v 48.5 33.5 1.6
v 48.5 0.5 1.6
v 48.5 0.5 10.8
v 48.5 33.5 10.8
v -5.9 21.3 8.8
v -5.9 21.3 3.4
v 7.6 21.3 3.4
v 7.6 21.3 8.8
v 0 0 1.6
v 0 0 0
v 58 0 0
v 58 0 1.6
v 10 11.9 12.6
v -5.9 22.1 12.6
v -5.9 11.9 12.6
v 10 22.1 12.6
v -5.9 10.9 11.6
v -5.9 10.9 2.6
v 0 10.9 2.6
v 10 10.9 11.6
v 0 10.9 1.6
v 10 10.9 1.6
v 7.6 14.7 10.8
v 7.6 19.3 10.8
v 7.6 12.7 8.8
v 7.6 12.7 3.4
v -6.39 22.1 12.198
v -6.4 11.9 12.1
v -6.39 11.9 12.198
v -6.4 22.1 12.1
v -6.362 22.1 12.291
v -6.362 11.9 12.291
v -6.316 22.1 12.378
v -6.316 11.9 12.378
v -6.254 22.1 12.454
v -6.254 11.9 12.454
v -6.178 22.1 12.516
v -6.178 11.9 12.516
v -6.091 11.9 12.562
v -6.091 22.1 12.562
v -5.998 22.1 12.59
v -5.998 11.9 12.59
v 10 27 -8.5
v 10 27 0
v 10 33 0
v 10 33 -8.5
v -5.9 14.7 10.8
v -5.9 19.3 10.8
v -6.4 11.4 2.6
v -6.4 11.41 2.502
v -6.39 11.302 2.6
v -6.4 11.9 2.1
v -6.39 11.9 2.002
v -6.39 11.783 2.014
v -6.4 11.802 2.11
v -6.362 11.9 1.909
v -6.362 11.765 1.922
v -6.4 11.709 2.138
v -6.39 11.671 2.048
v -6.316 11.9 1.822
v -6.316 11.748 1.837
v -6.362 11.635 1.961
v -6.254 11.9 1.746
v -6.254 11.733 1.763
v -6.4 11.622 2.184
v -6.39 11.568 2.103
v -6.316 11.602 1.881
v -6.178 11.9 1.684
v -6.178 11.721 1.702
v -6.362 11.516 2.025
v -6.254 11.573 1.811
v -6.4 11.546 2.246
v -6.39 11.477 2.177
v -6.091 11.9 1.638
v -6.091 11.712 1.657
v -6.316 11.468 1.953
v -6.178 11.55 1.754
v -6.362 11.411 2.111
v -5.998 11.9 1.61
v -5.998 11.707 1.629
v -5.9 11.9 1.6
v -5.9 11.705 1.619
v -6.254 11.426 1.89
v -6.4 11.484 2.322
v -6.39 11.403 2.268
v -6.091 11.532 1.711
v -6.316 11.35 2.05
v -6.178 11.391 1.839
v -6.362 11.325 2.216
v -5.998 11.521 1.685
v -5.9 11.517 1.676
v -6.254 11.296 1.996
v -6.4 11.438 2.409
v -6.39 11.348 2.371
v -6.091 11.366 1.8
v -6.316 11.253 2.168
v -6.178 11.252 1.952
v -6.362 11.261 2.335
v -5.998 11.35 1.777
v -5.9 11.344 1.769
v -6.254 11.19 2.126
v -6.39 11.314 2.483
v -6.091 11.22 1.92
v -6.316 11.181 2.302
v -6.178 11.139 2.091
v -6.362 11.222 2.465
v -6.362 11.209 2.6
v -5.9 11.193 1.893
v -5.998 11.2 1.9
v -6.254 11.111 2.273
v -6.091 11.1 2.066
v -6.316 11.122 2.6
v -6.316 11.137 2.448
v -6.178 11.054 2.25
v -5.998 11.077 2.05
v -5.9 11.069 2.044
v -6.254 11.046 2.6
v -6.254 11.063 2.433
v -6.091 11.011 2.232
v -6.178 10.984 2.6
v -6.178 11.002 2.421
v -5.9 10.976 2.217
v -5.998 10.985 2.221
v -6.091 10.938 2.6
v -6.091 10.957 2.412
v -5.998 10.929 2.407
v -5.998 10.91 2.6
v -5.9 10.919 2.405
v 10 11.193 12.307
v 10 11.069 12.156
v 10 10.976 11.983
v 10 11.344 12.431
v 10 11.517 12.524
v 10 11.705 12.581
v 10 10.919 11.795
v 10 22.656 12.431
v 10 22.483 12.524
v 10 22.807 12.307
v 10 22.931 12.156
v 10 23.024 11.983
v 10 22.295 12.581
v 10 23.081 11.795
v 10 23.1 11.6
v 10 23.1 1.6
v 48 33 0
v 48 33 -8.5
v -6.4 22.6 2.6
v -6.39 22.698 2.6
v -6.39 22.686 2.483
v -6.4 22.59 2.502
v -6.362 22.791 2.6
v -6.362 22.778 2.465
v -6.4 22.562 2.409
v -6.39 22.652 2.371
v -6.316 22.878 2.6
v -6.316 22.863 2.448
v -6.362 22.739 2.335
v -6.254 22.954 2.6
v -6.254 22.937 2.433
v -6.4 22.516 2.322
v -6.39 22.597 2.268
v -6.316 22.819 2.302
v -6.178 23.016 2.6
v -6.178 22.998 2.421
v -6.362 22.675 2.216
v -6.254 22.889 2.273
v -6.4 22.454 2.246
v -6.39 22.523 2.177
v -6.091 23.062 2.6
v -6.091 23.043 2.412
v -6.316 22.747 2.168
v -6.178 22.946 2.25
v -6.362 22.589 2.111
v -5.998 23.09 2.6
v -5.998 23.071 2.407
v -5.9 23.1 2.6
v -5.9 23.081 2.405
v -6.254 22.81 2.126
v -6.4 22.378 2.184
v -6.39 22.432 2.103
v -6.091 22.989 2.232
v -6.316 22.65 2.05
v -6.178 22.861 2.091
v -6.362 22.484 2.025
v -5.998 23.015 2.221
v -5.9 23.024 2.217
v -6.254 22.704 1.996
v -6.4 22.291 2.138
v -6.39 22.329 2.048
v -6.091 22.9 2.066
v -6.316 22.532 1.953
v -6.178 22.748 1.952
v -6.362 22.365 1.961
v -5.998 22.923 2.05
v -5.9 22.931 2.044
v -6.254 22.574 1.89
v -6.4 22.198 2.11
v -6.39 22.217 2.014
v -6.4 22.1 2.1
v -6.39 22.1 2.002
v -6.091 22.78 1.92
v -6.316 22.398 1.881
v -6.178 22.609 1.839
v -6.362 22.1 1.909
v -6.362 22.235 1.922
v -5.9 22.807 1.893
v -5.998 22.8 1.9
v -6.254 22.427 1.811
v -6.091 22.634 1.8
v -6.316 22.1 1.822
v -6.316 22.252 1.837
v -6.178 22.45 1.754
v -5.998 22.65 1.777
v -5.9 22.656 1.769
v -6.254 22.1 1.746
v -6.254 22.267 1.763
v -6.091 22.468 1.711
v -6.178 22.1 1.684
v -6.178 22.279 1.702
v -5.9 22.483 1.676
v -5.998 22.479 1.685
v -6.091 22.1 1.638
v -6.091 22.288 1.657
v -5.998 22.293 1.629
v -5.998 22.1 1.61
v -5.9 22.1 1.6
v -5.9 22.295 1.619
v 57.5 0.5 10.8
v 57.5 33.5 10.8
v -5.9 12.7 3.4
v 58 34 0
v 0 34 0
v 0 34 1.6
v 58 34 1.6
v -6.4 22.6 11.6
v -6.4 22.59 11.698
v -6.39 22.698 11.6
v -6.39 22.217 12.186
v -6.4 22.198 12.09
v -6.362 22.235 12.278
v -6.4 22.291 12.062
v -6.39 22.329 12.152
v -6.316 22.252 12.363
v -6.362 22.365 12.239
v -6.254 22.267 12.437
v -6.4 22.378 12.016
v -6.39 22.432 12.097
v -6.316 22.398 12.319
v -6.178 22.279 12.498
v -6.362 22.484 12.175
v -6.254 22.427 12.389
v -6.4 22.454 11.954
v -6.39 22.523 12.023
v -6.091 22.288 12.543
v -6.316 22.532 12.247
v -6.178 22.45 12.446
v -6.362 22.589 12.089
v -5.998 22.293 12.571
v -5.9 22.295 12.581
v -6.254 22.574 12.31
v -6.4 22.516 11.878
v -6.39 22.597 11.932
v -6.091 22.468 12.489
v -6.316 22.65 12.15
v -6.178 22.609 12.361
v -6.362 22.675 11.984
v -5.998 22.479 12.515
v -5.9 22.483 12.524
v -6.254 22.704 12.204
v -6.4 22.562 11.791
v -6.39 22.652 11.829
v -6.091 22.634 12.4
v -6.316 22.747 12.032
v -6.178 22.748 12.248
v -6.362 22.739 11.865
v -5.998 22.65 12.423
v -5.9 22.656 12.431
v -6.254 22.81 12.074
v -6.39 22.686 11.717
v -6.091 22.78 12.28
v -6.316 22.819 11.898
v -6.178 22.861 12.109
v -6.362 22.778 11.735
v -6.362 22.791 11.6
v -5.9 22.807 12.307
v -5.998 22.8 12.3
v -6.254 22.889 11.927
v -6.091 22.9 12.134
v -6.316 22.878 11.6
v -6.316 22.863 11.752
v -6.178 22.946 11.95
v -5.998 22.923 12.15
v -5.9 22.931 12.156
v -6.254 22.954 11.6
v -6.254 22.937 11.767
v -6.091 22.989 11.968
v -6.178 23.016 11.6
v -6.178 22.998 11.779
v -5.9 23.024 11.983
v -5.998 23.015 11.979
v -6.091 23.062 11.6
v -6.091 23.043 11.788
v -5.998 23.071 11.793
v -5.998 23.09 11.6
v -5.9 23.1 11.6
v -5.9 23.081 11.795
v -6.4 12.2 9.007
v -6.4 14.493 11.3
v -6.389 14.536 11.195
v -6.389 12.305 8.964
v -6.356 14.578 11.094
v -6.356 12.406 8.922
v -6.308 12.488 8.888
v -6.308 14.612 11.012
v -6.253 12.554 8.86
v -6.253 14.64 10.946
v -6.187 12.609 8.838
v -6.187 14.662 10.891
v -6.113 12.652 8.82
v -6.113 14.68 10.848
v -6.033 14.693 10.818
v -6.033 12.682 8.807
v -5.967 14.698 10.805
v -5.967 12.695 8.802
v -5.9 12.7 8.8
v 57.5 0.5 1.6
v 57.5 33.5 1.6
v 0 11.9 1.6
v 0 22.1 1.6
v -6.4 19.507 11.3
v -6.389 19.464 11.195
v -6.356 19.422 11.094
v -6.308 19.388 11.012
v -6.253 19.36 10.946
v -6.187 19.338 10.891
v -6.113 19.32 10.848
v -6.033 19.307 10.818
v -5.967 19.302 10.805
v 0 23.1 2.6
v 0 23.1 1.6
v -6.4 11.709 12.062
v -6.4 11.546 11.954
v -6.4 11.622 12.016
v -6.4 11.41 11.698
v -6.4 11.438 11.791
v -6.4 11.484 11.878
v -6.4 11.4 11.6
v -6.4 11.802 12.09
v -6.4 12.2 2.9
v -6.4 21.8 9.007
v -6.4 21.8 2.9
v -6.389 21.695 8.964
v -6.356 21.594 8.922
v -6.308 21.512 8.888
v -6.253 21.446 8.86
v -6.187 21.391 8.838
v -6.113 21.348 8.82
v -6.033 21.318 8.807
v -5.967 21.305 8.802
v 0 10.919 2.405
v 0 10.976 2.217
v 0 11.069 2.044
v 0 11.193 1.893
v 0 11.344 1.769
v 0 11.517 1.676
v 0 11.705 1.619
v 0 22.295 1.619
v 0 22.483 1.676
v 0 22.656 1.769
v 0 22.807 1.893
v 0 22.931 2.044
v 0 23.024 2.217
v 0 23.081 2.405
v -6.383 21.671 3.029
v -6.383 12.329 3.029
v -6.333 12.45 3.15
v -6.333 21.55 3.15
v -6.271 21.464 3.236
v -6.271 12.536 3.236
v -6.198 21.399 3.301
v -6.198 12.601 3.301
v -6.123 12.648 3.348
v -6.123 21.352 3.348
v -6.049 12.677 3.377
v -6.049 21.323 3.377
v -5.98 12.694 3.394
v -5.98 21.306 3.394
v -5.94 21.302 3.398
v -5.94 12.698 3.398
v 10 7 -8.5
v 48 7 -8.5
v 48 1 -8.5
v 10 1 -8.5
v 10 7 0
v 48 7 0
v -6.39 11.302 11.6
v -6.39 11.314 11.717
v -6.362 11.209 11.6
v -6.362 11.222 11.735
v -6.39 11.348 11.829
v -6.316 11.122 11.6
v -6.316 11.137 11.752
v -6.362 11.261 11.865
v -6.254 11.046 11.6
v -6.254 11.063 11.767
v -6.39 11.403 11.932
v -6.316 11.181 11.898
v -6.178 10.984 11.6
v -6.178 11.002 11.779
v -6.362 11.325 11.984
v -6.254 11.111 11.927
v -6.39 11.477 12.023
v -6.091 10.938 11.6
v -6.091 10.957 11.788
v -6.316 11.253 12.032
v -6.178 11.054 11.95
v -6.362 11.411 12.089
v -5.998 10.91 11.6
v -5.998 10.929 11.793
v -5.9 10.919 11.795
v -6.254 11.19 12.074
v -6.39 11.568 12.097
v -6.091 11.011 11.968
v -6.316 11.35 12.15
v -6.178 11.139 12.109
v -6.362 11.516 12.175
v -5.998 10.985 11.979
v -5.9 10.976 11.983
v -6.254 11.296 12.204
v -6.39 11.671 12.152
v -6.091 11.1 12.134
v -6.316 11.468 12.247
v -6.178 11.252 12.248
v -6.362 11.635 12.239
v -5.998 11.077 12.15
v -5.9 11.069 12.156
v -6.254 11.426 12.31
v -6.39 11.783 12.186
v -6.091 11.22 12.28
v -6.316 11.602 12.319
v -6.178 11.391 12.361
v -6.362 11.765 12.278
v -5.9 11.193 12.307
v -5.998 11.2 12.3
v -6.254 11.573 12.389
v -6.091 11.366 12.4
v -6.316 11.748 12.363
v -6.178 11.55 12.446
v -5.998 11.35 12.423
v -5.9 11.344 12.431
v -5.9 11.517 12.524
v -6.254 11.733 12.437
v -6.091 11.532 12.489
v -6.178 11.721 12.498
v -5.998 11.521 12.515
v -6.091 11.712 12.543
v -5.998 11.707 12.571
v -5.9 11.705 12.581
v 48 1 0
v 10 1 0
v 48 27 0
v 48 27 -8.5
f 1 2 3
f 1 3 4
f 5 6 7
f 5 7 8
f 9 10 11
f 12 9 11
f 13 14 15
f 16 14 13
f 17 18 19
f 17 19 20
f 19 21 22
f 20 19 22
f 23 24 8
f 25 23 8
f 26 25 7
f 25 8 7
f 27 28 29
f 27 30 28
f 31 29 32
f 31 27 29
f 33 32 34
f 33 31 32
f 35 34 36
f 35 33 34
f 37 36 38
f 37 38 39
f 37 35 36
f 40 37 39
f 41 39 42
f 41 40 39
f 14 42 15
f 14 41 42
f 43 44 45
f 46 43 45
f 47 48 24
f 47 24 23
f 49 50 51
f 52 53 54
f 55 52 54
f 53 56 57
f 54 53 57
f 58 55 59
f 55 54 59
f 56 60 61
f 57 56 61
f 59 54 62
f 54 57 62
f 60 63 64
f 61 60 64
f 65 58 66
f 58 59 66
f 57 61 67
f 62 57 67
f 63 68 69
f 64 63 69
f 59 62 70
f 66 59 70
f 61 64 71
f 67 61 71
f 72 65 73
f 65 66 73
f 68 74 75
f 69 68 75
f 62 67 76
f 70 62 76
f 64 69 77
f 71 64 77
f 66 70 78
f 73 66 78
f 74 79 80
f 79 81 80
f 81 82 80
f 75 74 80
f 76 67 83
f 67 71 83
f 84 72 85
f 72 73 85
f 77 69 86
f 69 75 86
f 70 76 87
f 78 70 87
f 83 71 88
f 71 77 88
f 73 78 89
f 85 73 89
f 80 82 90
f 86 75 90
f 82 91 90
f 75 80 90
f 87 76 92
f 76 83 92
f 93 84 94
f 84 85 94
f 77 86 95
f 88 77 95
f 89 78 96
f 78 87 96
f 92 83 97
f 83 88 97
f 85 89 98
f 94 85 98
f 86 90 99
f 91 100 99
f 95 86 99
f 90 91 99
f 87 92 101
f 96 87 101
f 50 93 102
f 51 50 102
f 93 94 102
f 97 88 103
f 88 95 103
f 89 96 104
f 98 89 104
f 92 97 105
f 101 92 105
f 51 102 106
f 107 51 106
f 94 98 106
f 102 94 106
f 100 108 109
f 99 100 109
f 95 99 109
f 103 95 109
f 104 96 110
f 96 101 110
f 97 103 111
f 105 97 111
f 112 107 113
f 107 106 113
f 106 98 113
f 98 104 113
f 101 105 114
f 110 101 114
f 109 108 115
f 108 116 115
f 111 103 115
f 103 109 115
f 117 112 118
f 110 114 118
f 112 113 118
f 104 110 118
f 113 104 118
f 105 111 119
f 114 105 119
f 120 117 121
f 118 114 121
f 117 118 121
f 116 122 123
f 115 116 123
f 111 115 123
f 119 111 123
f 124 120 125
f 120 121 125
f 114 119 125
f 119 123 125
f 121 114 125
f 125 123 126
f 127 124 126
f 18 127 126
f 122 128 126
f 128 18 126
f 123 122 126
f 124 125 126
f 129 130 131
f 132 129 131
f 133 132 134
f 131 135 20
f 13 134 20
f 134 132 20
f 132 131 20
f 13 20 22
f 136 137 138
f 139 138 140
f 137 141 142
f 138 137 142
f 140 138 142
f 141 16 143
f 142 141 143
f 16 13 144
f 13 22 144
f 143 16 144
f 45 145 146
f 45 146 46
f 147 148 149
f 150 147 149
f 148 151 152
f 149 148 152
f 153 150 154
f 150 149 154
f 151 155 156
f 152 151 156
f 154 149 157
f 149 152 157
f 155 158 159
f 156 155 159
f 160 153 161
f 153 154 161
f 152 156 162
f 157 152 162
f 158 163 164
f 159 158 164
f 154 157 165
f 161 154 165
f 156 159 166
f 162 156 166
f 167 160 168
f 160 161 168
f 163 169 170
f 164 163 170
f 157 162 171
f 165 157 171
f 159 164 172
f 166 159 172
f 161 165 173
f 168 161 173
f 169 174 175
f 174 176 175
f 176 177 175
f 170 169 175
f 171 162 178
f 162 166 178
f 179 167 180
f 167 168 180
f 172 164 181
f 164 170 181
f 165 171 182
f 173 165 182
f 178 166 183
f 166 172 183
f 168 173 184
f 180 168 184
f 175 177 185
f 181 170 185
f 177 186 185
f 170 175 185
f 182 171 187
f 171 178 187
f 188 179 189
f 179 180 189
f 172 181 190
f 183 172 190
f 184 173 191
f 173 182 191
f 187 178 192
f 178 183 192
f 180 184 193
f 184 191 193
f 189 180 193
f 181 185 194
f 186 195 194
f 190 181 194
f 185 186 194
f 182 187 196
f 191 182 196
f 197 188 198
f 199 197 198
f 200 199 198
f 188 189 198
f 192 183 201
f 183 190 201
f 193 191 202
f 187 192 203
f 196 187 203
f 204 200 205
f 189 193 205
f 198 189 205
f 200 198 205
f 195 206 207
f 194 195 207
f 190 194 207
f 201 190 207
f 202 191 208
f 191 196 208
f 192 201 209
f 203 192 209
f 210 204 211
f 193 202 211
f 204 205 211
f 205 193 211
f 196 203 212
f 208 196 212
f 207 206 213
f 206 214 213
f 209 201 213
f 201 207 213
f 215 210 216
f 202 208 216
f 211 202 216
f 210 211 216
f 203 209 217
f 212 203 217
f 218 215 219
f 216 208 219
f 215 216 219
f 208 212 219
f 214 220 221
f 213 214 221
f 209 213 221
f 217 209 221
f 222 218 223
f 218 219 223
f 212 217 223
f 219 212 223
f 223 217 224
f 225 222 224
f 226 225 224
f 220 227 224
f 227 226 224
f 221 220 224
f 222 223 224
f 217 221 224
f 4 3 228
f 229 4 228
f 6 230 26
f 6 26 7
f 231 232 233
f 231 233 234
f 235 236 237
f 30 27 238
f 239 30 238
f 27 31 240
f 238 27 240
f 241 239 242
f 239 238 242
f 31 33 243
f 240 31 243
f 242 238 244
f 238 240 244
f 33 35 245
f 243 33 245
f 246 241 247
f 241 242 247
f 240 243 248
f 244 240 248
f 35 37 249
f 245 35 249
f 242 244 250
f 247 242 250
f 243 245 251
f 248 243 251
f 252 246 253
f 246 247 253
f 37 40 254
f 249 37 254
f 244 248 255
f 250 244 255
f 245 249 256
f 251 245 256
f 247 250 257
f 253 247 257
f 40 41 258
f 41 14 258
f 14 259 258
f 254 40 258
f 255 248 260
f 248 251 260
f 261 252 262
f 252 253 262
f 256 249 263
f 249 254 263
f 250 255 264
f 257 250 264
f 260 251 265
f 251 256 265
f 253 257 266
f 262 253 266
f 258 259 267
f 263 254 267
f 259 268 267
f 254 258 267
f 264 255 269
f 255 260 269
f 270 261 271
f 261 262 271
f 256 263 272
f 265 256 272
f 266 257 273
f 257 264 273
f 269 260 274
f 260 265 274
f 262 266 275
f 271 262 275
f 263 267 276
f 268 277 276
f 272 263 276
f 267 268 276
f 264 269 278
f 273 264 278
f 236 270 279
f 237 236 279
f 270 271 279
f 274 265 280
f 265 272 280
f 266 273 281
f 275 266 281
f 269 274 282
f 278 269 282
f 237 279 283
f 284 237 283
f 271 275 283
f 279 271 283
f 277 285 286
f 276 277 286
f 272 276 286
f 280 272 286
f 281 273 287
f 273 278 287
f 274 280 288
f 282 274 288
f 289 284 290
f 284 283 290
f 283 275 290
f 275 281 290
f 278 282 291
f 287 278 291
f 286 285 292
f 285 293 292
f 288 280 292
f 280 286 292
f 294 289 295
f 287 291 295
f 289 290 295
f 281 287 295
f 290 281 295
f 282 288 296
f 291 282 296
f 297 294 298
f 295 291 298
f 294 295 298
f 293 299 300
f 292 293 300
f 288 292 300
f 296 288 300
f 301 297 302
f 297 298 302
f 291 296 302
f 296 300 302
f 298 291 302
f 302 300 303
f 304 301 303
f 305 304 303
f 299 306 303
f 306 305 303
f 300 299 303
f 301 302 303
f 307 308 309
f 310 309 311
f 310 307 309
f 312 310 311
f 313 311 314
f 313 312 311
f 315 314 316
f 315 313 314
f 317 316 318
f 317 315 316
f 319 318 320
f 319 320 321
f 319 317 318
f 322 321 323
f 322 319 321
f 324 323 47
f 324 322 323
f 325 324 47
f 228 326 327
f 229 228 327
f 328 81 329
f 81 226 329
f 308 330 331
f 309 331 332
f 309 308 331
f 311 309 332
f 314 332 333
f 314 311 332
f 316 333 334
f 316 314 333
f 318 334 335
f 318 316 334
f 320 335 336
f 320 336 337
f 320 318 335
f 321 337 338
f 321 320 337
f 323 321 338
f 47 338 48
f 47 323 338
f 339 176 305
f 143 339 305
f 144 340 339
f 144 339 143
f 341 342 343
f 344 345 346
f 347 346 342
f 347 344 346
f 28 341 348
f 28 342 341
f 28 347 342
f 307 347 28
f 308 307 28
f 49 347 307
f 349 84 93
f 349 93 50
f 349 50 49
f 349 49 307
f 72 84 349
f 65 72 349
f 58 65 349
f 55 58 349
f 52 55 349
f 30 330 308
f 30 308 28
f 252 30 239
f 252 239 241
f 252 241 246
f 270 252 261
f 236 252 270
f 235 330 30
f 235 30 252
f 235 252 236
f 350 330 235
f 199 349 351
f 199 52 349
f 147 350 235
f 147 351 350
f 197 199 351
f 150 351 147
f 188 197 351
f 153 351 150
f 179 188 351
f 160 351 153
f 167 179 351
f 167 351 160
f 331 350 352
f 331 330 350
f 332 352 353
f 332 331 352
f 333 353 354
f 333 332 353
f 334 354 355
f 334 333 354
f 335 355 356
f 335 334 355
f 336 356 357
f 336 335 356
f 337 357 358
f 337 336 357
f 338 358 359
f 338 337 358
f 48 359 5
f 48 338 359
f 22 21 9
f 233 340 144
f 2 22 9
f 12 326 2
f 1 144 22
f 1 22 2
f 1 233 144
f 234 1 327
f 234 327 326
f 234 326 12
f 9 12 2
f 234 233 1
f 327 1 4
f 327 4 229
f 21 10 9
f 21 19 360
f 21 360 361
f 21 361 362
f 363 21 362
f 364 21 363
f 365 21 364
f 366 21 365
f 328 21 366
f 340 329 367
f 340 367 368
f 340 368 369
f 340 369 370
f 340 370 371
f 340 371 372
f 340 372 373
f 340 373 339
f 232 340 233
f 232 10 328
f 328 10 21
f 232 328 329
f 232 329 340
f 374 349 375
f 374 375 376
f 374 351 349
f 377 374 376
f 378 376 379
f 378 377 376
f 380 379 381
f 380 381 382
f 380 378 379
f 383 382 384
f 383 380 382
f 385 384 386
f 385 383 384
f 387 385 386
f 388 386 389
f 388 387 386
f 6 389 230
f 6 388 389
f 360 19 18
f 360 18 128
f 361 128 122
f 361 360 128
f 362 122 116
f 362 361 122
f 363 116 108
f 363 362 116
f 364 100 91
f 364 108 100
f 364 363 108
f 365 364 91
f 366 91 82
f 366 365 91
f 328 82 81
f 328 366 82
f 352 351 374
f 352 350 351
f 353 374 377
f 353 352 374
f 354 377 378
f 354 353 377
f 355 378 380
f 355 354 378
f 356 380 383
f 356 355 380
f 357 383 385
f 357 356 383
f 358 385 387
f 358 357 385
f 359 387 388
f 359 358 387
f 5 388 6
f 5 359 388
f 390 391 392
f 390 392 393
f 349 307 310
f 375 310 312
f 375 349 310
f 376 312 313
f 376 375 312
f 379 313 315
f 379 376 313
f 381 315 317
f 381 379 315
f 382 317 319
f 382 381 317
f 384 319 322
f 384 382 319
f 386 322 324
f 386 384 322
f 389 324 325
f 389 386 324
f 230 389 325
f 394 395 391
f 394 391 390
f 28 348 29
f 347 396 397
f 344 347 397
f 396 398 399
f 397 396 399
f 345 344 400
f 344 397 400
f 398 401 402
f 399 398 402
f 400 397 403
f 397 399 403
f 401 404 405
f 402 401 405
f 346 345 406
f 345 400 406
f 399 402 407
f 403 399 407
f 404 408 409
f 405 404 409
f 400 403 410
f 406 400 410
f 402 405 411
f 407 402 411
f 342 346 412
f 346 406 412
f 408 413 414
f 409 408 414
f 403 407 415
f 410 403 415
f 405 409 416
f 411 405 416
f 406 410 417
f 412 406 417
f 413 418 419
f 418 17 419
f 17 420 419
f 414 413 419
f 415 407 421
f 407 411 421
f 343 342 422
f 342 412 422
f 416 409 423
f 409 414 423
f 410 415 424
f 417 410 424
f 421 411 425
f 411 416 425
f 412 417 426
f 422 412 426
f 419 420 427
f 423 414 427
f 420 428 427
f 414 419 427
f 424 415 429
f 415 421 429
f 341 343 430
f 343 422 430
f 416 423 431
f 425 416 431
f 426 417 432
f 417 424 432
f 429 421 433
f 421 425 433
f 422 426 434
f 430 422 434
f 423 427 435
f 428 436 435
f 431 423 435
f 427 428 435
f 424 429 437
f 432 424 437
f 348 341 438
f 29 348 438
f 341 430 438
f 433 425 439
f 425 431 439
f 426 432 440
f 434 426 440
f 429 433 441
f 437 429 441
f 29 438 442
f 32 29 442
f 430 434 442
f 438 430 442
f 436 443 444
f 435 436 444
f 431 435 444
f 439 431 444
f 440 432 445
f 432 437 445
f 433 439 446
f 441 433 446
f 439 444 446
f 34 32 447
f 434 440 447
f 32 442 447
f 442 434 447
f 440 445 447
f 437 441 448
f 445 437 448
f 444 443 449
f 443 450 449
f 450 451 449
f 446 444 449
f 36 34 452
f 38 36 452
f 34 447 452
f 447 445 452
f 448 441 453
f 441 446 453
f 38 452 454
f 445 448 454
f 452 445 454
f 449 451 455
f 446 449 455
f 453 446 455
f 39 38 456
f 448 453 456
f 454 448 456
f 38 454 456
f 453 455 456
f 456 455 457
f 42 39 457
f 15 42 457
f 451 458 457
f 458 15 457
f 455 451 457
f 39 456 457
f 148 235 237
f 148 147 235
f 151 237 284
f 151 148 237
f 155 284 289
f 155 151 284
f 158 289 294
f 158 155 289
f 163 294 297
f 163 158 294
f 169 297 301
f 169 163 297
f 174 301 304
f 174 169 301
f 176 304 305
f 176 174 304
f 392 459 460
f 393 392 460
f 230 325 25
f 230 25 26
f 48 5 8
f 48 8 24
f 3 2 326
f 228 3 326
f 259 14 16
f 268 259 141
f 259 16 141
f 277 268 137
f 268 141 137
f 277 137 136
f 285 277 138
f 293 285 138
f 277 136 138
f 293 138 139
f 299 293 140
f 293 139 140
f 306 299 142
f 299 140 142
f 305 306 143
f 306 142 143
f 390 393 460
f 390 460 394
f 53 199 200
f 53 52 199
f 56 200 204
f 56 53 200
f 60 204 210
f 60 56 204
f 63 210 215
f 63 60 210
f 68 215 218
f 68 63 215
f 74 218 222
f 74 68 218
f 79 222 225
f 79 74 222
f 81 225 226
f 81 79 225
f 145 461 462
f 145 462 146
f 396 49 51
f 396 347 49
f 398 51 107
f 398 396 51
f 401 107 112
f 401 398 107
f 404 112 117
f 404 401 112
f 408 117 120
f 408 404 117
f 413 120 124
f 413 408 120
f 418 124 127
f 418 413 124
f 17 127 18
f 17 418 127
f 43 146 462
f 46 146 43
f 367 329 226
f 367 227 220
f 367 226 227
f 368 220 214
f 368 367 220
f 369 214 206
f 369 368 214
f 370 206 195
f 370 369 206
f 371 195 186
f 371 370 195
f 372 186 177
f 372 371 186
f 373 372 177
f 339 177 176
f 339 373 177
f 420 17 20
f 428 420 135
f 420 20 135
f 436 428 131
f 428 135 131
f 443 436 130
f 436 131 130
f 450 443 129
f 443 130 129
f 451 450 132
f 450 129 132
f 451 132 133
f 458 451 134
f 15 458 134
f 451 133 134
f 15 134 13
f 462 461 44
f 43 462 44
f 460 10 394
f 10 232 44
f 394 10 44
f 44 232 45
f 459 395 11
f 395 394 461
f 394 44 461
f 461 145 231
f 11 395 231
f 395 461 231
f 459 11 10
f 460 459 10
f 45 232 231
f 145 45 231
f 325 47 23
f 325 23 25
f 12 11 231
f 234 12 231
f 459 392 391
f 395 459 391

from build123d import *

# Parameters (mm, degrees)
SKETCH1_W          = 58
SKETCH1_H          = 34
EXTRUDE1_DEPTH     = 1.6
SKETCH2_W          = 38
SKETCH2_H          = 6
EXTRUDE2_DEPTH     = 8.5
SKETCH3_W          = 9
SKETCH3_H          = 33
EXTRUDE3_DEPTH     = 9.2
SKETCH4_W          = 16.4
SKETCH4_H          = 12.2
EXTRUDE4_DEPTH     = 11
CUT_EXTRUDE1_DEPTH = 14
FILLET1_R          = 1
FILLET2_R          = 0.5


with BuildPart() as part:
    # Sketch1 → Extrude1 (new body)
    with BuildSketch(Plane.XY):
        with Locations((29, 17)):
            Rectangle(SKETCH1_W, SKETCH1_H)
    extrude(amount=EXTRUDE1_DEPTH)

    # Sketch2 → Extrude2 (add)
    with BuildSketch(Plane(origin=(0, 0, 0), x_dir=(-1, 0, 0), z_dir=(0, 0, -1))):
        with Locations((-29, 30)):
            Rectangle(SKETCH2_W, SKETCH2_H)
        with Locations((-29, 4)):
            Rectangle(SKETCH2_W, SKETCH2_H)
    extrude(amount=EXTRUDE2_DEPTH)

    # Sketch3 → Extrude3 (add)
    with BuildSketch(Plane.XY.offset(1.6)):
        with Locations((53, 17)):
            Rectangle(SKETCH3_W, SKETCH3_H)
    extrude(amount=EXTRUDE3_DEPTH)

    # Sketch4 → Extrude4 (add)
    with BuildSketch(Plane.XY.offset(1.6)):
        with Locations((1.8, 17)):
            Rectangle(SKETCH4_W, SKETCH4_H)
    extrude(amount=EXTRUDE4_DEPTH)

    # Sketch5 → Cut-Extrude1 (cut)
    with BuildSketch(Plane.ZY.offset(6.4)):
        Polygon((8.8, 21.3), (10.8, 19.3), (10.8, 14.7), (8.8, 12.7), (3.4, 12.7), (3.4, 21.3), align=None)
    extrude(amount=-CUT_EXTRUDE1_DEPTH, mode=Mode.SUBTRACT)

    # Fillet1
    fillet1_edges = [part.edges().sort_by_distance(p)[0] for p in [
        (-3.2, 23.1, 1.6),
        (-3.2, 10.9, 1.6),
        (1.8, 23.1, 12.6),
        (1.8, 10.9, 12.6),
    ]]
    fillet(fillet1_edges, radius=FILLET1_R)

    # Fillet2
    fillet2_edges = [part.edges().sort_by_distance(p)[0] for p in [
        (-6.4, 21.3, 6.1),
        (-6.4, 17, 3.4),
        (-6.4, 12.7, 6.1),
        (-6.4, 13.7, 9.8),
        (-6.4, 17, 10.8),
        (-6.4, 20.3, 9.8),
        (-6.4, 17, 12.6),
        (-6.4, 10.9, 7.1),
        (-6.4, 17, 1.6),
        (-6.4, 23.1, 7.1),
        (-6.4, 22.807106781, 12.307106781),
        (-6.4, 22.807106781, 1.892893219),
        (-6.4, 11.192893219, 1.892893219),
        (-6.4, 11.192893219, 12.307106781),
    ]]
    fillet(fillet2_edges, radius=FILLET2_R)


solid = part.part
